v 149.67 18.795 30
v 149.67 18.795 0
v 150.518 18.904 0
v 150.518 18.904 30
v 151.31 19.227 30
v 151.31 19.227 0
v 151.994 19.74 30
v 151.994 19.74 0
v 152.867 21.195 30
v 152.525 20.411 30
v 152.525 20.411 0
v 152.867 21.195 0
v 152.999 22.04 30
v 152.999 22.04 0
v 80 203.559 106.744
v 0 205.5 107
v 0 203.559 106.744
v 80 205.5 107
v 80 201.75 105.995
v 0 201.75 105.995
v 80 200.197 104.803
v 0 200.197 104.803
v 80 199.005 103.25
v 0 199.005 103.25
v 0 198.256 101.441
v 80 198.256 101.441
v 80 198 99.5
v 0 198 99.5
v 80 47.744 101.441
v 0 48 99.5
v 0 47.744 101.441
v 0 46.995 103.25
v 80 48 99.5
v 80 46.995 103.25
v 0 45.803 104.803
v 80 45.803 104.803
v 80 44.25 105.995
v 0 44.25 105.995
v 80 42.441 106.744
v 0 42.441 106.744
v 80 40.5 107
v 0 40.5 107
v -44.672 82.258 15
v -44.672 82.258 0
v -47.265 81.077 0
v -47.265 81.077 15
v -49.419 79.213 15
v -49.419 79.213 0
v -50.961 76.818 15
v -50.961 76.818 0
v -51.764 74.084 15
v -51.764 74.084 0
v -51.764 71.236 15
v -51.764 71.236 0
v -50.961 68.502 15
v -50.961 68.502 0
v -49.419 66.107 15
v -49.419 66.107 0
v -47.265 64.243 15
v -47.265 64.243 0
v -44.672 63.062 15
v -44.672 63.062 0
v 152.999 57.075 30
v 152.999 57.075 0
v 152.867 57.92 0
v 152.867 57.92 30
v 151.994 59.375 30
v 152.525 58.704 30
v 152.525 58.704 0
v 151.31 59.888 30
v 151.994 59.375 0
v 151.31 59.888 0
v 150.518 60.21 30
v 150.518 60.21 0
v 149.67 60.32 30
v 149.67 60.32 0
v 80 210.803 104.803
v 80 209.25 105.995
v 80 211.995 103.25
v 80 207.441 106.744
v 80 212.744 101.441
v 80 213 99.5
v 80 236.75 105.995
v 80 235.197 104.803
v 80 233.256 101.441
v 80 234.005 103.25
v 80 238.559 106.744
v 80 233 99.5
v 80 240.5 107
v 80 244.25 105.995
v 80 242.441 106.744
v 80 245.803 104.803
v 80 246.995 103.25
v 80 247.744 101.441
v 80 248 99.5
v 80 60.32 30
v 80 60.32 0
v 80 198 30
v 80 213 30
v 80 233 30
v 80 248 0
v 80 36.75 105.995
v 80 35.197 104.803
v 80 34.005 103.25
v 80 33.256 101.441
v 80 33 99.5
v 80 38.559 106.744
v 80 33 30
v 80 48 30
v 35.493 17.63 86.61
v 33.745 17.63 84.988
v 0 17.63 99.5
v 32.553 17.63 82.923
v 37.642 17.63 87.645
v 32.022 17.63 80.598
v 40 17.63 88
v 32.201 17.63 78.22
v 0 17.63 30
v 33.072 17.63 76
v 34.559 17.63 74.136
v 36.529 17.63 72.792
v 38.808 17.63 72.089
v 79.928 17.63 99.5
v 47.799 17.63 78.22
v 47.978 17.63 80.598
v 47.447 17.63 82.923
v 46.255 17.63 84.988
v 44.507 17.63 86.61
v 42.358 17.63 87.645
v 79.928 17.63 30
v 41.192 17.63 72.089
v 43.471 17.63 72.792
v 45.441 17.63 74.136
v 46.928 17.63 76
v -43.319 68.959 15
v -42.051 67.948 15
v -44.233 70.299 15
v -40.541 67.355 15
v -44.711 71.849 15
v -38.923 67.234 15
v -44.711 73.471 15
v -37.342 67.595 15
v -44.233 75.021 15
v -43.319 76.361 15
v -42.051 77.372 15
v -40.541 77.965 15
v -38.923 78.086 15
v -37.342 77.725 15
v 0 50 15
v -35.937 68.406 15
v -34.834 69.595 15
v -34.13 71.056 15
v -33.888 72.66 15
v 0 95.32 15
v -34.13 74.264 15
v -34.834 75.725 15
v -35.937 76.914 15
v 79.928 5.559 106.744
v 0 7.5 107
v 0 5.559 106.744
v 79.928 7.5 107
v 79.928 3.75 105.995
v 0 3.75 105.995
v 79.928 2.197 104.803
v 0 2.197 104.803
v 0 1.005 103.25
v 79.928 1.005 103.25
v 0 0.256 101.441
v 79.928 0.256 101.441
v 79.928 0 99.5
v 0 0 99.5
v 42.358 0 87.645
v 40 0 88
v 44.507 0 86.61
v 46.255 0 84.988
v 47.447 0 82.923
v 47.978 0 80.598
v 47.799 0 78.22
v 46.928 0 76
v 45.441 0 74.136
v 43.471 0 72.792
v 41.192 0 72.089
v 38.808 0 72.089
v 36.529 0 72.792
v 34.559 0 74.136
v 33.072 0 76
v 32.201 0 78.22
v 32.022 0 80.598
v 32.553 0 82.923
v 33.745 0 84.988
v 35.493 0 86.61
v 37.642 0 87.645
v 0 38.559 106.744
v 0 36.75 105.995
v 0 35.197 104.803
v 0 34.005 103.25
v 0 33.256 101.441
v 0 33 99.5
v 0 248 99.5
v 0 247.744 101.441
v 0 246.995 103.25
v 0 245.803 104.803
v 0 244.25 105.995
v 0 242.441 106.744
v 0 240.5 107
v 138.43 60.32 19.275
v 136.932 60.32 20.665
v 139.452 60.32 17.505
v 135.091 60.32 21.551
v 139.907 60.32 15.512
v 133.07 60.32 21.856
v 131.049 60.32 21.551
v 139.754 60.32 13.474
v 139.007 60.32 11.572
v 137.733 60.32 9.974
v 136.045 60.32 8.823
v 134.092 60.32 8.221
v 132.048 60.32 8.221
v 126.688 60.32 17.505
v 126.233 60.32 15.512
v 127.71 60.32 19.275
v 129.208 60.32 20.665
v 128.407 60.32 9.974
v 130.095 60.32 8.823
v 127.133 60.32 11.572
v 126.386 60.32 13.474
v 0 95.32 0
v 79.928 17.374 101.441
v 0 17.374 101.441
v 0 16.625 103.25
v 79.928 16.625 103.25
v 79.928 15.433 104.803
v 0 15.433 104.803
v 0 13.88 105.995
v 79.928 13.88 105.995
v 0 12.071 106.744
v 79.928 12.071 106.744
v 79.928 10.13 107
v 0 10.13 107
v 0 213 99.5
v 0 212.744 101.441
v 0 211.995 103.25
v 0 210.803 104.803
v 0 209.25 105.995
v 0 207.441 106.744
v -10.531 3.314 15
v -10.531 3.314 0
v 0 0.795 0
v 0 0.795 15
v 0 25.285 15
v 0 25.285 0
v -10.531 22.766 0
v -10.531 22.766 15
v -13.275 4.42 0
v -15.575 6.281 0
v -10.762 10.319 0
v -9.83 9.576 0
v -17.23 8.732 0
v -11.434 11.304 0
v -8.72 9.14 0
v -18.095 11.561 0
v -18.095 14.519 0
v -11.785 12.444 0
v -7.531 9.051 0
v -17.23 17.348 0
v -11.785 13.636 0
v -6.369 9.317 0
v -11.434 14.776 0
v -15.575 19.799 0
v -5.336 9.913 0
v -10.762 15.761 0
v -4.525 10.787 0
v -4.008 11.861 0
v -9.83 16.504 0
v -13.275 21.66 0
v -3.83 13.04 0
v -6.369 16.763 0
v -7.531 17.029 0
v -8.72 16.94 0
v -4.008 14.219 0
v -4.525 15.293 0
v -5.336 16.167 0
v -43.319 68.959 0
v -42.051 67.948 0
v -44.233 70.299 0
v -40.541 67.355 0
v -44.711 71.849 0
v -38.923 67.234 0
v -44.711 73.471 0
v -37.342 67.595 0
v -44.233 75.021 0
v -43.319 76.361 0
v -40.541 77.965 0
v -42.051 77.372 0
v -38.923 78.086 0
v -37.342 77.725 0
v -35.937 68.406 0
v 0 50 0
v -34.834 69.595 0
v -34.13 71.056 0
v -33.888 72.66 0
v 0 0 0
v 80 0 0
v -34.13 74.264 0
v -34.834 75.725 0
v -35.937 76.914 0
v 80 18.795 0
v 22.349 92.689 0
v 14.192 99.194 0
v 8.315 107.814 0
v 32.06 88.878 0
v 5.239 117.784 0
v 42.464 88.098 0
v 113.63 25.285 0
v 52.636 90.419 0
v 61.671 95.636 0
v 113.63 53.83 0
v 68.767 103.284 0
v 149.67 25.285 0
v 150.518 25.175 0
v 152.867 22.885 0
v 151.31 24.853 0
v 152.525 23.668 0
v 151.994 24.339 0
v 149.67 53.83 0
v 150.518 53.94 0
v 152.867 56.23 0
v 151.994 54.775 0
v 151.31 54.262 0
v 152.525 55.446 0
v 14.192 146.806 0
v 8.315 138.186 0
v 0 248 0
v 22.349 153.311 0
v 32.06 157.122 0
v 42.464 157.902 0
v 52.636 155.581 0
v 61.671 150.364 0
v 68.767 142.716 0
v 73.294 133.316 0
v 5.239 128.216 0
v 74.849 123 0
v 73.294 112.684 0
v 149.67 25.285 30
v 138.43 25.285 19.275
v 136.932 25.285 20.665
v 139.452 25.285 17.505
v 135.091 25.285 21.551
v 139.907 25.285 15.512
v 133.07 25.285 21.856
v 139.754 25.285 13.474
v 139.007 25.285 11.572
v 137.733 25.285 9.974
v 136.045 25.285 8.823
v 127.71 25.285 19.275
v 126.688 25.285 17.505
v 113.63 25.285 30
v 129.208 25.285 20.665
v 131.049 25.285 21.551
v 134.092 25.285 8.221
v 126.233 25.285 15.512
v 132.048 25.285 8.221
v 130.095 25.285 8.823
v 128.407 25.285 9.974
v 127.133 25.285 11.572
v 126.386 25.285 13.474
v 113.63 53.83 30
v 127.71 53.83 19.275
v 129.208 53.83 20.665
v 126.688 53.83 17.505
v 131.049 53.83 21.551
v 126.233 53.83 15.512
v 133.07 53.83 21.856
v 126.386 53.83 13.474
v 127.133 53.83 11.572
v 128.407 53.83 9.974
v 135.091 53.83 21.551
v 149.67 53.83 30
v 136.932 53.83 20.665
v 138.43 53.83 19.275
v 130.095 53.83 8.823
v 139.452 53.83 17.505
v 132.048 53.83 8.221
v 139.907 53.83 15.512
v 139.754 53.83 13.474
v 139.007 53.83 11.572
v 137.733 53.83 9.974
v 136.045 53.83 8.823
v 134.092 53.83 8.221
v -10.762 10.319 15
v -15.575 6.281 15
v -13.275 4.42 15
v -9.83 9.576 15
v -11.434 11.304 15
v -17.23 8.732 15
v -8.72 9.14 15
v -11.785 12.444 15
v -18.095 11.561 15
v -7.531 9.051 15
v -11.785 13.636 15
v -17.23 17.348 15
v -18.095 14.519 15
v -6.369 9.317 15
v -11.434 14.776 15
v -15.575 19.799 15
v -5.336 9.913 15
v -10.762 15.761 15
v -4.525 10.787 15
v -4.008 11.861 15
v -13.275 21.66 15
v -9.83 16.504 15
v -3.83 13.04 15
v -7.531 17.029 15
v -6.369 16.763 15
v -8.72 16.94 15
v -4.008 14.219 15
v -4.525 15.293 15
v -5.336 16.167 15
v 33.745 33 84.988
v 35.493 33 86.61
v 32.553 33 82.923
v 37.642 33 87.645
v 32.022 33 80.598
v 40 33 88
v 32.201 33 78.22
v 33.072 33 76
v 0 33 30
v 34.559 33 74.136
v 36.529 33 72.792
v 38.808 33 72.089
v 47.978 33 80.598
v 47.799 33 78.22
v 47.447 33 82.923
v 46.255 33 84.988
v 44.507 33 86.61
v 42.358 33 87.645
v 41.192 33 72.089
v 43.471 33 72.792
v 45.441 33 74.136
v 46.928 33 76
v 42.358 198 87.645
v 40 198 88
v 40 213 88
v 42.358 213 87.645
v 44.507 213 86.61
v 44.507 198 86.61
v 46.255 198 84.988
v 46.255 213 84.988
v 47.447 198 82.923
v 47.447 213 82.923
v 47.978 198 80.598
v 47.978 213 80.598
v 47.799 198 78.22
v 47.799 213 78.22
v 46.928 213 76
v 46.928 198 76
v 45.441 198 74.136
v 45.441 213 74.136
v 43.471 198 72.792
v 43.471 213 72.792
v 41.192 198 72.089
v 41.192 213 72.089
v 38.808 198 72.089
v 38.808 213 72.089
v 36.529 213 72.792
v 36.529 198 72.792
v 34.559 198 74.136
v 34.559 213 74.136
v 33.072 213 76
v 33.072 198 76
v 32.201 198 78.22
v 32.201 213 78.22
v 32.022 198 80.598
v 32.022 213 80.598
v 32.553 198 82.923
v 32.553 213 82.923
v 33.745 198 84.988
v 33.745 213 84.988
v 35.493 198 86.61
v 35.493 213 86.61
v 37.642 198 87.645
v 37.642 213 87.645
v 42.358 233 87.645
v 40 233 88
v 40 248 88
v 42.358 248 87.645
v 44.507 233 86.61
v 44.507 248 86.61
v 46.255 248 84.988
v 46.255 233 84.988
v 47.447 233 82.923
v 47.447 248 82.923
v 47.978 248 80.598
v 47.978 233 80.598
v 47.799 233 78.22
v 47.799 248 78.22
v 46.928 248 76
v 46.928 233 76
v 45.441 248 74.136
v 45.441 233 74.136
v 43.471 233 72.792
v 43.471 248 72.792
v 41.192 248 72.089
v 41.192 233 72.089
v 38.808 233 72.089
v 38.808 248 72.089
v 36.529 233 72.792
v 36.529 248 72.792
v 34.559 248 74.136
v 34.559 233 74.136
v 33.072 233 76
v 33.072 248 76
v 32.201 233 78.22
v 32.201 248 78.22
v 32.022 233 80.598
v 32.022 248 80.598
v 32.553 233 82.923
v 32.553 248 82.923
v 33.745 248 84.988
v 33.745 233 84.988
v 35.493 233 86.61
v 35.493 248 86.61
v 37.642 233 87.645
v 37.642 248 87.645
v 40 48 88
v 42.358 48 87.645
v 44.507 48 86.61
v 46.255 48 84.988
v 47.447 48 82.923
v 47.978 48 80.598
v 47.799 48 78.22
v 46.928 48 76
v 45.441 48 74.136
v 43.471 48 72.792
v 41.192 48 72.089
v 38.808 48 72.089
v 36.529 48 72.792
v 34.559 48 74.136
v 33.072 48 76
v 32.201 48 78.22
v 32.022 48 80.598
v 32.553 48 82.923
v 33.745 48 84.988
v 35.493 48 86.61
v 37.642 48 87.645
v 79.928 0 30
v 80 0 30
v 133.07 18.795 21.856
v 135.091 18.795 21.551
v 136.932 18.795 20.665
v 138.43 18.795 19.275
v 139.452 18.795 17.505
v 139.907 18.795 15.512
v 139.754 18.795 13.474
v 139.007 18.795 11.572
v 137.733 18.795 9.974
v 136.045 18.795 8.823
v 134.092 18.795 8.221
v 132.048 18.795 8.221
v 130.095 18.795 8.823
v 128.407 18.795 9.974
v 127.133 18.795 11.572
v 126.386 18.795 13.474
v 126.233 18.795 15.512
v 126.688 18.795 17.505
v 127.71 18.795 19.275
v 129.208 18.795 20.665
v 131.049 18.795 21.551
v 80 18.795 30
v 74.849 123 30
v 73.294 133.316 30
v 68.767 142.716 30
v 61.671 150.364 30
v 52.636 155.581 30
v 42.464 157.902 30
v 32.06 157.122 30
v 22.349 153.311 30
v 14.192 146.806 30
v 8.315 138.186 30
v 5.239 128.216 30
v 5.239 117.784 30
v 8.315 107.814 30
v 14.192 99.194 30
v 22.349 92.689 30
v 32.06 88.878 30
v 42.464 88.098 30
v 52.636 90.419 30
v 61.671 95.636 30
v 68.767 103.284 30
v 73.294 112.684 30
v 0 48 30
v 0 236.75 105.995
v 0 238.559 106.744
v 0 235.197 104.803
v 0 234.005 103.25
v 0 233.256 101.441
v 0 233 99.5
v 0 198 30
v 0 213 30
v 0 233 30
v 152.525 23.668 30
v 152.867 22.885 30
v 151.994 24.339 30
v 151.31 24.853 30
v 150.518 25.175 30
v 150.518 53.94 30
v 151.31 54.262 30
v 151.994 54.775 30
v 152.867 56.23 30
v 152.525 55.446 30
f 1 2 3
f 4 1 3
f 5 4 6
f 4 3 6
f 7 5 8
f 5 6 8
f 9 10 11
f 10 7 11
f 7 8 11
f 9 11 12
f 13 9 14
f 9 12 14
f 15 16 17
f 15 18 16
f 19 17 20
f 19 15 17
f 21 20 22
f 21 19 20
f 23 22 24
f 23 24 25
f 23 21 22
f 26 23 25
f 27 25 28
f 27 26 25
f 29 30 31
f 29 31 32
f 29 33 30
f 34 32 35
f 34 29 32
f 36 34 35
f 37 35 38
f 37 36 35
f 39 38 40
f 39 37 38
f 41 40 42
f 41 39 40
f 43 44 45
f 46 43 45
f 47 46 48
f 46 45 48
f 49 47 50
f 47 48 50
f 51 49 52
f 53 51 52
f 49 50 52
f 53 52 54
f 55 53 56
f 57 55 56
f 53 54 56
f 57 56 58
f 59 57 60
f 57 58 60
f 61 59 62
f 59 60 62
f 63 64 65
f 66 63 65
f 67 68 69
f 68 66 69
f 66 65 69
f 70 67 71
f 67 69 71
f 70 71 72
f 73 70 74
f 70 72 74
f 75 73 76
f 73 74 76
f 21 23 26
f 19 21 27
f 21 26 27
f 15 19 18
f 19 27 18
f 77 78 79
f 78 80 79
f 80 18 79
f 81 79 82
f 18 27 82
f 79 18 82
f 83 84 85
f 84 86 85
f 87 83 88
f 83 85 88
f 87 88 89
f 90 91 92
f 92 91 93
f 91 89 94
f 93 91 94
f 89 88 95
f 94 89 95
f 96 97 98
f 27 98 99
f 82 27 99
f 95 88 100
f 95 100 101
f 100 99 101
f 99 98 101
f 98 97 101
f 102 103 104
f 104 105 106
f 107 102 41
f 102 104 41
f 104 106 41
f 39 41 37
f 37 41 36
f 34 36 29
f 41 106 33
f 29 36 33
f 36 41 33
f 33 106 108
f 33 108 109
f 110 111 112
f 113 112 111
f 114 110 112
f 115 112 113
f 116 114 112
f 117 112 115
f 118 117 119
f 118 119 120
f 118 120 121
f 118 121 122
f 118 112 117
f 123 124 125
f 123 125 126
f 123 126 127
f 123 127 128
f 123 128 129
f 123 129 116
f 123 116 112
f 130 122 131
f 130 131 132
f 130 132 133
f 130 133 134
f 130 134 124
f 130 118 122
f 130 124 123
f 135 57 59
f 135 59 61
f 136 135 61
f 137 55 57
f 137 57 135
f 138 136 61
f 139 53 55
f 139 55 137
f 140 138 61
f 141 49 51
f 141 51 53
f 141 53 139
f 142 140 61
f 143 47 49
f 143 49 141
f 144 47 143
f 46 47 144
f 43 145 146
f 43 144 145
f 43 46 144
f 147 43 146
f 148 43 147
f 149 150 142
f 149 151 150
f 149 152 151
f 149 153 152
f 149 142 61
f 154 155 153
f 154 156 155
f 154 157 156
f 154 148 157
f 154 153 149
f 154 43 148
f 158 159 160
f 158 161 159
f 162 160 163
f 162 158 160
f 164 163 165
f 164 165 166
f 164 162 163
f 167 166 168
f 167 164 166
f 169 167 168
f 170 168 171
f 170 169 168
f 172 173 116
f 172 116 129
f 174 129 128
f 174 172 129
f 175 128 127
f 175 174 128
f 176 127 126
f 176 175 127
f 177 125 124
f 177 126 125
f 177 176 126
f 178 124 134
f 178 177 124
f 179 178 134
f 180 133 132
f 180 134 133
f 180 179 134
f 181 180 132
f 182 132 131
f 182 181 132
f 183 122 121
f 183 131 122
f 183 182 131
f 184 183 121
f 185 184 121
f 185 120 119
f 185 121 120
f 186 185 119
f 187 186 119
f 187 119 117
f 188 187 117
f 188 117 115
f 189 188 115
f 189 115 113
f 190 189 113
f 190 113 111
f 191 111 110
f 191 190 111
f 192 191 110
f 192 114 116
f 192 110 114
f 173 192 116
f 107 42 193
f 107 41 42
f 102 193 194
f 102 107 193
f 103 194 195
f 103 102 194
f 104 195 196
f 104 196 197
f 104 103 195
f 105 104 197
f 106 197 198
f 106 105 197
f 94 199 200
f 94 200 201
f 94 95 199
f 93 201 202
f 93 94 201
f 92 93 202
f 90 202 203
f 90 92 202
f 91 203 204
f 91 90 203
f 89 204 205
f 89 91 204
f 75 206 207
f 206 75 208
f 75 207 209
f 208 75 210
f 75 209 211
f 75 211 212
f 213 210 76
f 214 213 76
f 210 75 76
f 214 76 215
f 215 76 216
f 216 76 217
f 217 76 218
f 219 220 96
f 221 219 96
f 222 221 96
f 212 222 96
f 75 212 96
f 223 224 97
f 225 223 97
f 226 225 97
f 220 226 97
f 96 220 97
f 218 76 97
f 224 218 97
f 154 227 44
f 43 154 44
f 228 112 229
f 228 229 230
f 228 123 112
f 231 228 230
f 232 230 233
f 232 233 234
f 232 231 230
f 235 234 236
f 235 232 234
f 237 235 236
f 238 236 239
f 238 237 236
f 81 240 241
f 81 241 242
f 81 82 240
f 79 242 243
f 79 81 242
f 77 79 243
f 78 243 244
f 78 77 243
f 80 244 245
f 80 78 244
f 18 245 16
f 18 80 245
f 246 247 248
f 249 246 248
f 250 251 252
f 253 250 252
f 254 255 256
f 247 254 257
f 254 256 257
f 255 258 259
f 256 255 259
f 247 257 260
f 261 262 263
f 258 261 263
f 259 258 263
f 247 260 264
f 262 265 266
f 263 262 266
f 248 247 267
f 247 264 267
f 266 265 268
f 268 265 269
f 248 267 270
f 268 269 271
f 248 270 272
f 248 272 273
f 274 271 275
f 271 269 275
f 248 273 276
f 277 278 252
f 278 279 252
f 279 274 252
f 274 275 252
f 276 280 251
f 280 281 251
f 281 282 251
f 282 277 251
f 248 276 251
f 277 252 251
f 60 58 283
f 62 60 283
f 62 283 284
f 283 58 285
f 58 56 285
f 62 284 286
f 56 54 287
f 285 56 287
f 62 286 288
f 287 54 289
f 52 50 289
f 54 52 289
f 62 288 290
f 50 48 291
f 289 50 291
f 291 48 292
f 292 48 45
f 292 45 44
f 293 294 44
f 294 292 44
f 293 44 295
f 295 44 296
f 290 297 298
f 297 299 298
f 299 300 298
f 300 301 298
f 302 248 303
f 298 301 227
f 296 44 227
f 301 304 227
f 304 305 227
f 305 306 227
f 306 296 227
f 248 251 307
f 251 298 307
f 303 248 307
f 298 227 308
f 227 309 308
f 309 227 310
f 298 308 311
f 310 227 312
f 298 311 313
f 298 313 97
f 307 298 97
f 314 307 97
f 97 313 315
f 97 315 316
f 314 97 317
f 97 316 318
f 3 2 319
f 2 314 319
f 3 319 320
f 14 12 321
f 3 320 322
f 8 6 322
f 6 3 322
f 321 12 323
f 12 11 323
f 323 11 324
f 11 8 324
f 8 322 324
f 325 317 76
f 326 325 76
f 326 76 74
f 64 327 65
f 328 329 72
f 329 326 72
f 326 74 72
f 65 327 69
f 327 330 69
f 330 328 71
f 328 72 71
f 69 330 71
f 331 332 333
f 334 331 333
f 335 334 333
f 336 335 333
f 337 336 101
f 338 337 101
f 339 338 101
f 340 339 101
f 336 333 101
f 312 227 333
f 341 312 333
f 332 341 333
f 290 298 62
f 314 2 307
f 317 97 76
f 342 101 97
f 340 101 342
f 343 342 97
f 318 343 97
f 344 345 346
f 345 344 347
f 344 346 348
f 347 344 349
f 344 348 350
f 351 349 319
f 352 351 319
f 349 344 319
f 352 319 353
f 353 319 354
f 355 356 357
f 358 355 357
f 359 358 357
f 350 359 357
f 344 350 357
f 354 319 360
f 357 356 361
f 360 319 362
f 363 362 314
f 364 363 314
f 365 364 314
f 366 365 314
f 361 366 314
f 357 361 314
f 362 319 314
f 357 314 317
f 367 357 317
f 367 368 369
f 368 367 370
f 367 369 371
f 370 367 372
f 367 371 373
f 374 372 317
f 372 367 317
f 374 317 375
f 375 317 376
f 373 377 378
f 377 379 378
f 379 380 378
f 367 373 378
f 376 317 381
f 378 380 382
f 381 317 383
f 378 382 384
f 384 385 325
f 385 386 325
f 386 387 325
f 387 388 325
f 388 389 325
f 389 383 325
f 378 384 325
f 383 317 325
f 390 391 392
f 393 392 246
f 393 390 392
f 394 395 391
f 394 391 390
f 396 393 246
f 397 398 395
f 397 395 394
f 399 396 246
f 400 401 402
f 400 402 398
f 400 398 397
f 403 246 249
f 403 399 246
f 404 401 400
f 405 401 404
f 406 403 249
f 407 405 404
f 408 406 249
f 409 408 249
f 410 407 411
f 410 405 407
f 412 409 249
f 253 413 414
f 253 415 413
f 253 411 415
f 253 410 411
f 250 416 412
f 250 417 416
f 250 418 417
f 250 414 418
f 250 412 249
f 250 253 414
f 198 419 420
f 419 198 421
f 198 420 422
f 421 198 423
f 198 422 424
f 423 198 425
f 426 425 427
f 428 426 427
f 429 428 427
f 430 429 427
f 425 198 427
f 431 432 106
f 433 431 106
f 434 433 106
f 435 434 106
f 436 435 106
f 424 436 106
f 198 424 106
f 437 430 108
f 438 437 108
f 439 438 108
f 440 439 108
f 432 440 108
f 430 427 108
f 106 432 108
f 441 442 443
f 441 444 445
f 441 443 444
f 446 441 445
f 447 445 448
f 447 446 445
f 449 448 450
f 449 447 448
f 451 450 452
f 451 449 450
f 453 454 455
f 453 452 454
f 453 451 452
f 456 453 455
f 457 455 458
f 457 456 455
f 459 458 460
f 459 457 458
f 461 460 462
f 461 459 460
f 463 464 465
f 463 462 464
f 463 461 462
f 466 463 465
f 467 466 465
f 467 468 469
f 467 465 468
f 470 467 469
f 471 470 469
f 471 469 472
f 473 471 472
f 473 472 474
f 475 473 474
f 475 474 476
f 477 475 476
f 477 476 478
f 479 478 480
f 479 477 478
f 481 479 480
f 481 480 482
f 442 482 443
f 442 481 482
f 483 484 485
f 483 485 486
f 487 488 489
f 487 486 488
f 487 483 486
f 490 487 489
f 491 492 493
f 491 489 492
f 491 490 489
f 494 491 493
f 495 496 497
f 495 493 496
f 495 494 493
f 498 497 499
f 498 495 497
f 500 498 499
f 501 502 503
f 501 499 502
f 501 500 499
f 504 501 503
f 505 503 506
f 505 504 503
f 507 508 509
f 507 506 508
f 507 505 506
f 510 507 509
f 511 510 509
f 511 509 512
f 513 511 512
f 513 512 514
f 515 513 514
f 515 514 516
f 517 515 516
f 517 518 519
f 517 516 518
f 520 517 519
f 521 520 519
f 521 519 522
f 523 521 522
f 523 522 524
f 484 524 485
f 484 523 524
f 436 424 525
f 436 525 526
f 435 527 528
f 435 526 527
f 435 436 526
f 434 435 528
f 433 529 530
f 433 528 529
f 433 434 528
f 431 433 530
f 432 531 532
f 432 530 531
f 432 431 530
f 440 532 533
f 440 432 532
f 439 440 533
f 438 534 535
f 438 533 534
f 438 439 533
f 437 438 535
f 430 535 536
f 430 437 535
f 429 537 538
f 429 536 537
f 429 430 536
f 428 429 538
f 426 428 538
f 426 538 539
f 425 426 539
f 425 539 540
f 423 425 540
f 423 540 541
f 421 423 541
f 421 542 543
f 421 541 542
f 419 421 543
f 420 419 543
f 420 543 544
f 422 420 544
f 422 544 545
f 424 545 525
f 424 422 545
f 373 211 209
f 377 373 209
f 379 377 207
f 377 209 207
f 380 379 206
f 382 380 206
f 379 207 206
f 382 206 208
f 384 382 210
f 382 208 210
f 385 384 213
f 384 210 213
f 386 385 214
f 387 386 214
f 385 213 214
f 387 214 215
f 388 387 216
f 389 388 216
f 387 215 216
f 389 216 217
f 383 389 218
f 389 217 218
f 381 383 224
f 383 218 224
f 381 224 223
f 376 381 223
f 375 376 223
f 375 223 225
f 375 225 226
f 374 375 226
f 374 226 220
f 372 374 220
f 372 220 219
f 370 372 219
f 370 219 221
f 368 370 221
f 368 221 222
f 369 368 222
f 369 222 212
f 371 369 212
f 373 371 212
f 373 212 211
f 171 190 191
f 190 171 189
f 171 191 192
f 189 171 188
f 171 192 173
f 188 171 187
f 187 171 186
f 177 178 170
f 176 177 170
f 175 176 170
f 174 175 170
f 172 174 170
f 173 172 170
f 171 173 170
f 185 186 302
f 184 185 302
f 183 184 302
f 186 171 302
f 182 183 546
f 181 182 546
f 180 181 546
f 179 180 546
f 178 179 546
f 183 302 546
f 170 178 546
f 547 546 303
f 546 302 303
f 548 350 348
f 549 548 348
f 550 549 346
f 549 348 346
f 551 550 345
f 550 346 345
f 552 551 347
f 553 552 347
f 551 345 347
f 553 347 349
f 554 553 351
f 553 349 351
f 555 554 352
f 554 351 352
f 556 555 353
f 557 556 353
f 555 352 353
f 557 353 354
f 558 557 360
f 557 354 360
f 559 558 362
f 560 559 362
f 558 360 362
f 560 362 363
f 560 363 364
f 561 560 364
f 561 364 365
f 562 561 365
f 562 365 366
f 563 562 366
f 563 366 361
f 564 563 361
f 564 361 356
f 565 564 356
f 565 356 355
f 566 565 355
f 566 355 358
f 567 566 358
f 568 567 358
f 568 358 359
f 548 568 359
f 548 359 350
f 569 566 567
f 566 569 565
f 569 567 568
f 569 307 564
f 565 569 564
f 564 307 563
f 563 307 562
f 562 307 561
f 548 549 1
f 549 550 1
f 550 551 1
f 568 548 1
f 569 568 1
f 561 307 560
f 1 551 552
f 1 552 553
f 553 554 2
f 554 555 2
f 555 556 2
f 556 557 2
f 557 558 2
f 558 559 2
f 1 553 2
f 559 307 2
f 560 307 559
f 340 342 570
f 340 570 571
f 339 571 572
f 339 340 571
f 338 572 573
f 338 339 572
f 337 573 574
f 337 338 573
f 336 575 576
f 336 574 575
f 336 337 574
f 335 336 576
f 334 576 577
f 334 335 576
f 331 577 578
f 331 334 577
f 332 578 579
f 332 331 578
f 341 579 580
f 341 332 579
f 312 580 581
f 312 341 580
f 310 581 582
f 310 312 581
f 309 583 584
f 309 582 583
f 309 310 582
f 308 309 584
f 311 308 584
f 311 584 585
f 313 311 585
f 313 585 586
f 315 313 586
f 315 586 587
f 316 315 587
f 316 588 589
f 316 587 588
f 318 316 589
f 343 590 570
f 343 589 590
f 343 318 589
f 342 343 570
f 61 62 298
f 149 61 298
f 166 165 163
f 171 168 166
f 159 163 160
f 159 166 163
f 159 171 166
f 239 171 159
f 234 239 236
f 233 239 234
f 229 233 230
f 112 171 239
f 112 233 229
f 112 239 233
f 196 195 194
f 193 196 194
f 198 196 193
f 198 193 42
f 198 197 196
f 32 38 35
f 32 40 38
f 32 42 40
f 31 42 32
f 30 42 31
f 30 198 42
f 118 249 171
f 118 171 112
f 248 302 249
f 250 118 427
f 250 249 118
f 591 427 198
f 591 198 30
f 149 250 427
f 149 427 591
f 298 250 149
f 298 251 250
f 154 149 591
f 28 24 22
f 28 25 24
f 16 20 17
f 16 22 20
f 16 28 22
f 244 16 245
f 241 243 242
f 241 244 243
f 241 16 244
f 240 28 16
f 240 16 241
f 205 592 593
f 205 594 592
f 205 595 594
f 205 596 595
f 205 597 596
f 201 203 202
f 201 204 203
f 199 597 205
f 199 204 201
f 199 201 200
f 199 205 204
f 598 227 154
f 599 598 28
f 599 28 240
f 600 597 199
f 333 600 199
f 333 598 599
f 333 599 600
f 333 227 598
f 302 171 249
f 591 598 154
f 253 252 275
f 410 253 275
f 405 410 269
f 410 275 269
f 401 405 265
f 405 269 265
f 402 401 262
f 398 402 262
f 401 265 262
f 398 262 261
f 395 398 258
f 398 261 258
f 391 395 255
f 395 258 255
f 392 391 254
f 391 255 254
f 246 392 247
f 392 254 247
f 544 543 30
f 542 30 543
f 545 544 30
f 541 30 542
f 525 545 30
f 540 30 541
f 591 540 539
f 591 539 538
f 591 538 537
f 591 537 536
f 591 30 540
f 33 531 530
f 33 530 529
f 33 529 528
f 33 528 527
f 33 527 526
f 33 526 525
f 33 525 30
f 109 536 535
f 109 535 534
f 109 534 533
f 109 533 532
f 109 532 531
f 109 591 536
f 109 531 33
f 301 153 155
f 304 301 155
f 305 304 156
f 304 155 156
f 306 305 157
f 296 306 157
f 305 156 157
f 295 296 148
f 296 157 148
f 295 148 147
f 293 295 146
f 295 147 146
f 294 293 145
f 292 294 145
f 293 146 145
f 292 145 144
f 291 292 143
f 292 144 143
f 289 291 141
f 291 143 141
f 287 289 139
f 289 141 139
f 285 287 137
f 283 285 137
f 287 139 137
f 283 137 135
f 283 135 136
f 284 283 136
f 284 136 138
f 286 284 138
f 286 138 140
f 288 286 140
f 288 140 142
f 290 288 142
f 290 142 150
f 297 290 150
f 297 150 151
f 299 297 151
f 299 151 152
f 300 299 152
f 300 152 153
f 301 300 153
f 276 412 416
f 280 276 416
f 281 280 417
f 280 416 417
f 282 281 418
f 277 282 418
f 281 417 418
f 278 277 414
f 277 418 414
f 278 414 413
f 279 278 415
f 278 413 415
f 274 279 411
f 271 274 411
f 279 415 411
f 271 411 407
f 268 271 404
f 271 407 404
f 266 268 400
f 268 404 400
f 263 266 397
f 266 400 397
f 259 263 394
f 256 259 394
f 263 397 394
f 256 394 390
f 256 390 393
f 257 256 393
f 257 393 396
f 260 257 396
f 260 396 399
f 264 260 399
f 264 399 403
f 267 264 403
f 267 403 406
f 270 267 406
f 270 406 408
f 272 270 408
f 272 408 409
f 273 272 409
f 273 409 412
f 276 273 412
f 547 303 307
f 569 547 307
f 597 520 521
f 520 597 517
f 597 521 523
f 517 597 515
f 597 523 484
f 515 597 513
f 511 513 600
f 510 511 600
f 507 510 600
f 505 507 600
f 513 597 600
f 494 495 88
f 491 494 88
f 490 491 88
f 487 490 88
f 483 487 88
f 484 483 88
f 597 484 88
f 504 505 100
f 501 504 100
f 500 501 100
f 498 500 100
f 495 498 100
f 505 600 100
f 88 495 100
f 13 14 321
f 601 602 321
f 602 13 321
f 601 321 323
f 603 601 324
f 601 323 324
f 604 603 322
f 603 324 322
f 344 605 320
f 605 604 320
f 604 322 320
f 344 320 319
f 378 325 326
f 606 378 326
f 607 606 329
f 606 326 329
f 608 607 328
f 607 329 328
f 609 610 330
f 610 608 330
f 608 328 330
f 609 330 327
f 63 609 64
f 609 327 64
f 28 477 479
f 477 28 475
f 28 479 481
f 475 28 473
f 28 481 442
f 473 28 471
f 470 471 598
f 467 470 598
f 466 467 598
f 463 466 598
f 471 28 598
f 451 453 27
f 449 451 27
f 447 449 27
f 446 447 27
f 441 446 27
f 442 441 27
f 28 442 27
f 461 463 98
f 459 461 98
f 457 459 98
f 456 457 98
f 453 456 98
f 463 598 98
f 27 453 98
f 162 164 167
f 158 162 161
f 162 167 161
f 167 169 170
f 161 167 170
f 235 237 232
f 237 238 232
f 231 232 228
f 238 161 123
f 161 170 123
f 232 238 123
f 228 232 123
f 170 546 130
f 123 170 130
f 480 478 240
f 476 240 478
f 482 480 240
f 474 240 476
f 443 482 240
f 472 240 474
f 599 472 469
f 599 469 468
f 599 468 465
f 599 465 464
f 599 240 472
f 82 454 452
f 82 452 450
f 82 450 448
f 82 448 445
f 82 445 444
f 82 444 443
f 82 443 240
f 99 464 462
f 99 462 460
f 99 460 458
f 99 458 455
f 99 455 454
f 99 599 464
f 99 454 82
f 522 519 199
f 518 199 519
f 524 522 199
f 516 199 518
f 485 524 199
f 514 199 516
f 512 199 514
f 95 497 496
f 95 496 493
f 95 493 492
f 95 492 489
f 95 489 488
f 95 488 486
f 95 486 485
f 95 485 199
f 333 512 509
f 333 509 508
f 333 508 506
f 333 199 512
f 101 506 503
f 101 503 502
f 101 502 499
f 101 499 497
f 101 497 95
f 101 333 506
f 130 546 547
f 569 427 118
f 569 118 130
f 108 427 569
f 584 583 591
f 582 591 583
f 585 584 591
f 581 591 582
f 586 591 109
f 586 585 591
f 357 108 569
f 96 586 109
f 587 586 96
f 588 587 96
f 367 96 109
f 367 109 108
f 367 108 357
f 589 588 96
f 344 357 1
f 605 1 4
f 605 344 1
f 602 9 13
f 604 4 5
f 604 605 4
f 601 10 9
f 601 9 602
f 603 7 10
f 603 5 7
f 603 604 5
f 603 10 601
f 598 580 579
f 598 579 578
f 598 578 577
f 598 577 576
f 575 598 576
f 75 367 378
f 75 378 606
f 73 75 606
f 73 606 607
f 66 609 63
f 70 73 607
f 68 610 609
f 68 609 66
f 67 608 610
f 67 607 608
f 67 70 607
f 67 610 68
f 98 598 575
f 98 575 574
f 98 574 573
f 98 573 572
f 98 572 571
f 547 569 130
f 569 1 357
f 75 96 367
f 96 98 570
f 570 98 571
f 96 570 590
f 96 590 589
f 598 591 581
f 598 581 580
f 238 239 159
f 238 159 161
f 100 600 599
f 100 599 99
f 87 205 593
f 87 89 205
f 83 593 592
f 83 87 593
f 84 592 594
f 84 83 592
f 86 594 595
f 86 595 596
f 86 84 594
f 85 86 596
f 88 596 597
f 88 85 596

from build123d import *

# Parameters (mm, degrees)
SKETCH2_W               = 80
SKETCH2_H               = 248
BOSS_EXTRUDE1_DEPTH     = 30
BOSS_EXTRUDE2_DEPTH     = 15
SKETCH3_W               = 80
SKETCH3_H               = 15
SKETCH3_W_2             = 79.927982428
SKETCH3_H_2             = 17.63
BOSS_EXTRUDE3_DEPTH     = 107
FILLET1_R               = 7.5
FILLET2_R               = 3.33
CUT_EXTRUDE1_DEPTH      = 311.421758238
CUT_EXTRUDE1_DEPTH_BACK = 311.421758238
SKETCH4_R               = 35
CUT_EXTRUDE2_DEPTH      = 311.421758238
CUT_EXTRUDE2_DEPTH_BACK = 311.421758238
SKETCH5_R               = 8
SKETCH6_R               = 6.855911781
CUT_EXTRUDE3_DEPTH      = 265.72901312
SKETCH7_R               = 5.441513082
CUT_EXTRUDE4_DEPTH      = 306.575961076
SKETCH8_R               = 4
CUT_EXTRUDE5_DEPTH      = 306.575961076


# Some blends are built 0.0001 mm under size
with BuildPart() as part:
    # Sketch2 → Boss-Extrude1 (new body)
    with BuildSketch(Plane.XY):
        with Locations((40, 124)):
            Rectangle(SKETCH2_W, SKETCH2_H)
        Polygon((153, 60.32), (80, 60.32), (80, 18.794599866), (153, 18.794599866), (153, 25.284599866), (113.63, 25.284599866), (113.63, 53.83), (153, 53.83), align=None)
    extrude(amount=BOSS_EXTRUDE1_DEPTH)

    # Sketch2<5> → Boss-Extrude2 (add)
    with BuildSketch(Plane.XY):
        with BuildLine():
            Line((0, 50), (0, 95.32))
            Line((0, 95.32), (-44.67244089, 82.258125951))
            ThreePointArc((-44.67244089, 82.258125951), (-51.866023561, 72.66), (-44.67244089, 63.061874049))
            Line((-44.67244089, 63.061874049), (0, 50))
        make_face()
        with BuildLine():
            Line((-10.531496207, 3.314319271), (0, 0.795400134))
            Line((0, 0.795400134), (0, 25.284599866))
            Line((0, 25.284599866), (-10.531496207, 22.765680729))
            ThreePointArc((-10.531496207, 22.765680729), (-18.205311701, 13.04), (-10.531496207, 3.314319271))
        make_face()
    extrude(amount=BOSS_EXTRUDE2_DEPTH)

    # Sketch3 → Boss-Extrude3 (add)
    with BuildSketch(Plane.XY):
        with Locations((40, 240.5)):
            Rectangle(SKETCH3_W, SKETCH3_H)
        with Locations((40, 205.5)):
            Rectangle(SKETCH3_W, SKETCH3_H)
        with Locations((40, 40.5)):
            Rectangle(SKETCH3_W, SKETCH3_H)
        with Locations((39.963991214, 8.815)):
            Rectangle(SKETCH3_W_2, SKETCH3_H_2)
    extrude(amount=BOSS_EXTRUDE3_DEPTH)

    # Fillet1
    fillet1_edges = [part.edges().sort_by_distance(p)[0] for p in [
        (39.963991214, 0, 107),
        (39.963991214, 17.63, 107),
        (40, 33, 107),
        (40, 48, 107),
        (40, 198, 107),
        (40, 213, 107),
        (40, 233, 107),
        (40, 248, 107),
    ]]
    fillet(fillet1_edges, radius=FILLET1_R - 0.0001)  # a hair under: the kernel refuses the full size

    # Fillet2
    # the kernel refuses this fillet: 3.33 mm, written as the material it takes off along each edge
    with BuildSketch(Plane(origin=(153, 18.794599866, -8.325), x_dir=(-1, 0, 0), z_dir=(0, 0, 1)), Plane(origin=(153, 25.284599866, -8.325), x_dir=(0, -1, 0), z_dir=(0, 0, 1)), Plane(origin=(153, 53.83, -8.325), x_dir=(-1, 0, 0), z_dir=(0, 0, 1)), Plane(origin=(153, 60.32, -8.325), x_dir=(0, -1, 0), z_dir=(0, 0, 1))) as fillet2_piece_1:
        with BuildLine():
            CenterArc((FILLET2_R, -FILLET2_R), FILLET2_R, 90, 90)
            Line((0, -FILLET2_R), (0, 0))
            Line((0, 0), (FILLET2_R, 0))
        make_face()
    extrude(amount=46.65, mode=Mode.SUBTRACT)

    # Sketch4 → Cut-Extrude1 (cut, two sides: drawn at the far end of the back side and taken through both)
    with BuildSketch(Plane.XY.offset(-CUT_EXTRUDE1_DEPTH_BACK)):
        with Locations((39.848575035, 123)):
            Circle(SKETCH4_R)
    extrude(amount=CUT_EXTRUDE1_DEPTH + CUT_EXTRUDE1_DEPTH_BACK, mode=Mode.SUBTRACT)

    # Sketch5 → Cut-Extrude2 (cut, two sides: drawn at the far end of the back side and taken through both)
    with BuildSketch(Plane(origin=(0, 0, 0), x_dir=(1, 0, 0), z_dir=(0, 1, 0)).offset(-CUT_EXTRUDE2_DEPTH_BACK)):
        with Locations(Location((40, -80, 0), (0, 0, 270))):
            Circle(SKETCH5_R)
    extrude(amount=CUT_EXTRUDE2_DEPTH + CUT_EXTRUDE2_DEPTH_BACK, mode=Mode.SUBTRACT)

    # Sketch6 → Cut-Extrude3 (cut, through all)
    with BuildSketch(Plane(origin=(0, 60.32, 0), x_dir=(1, 0, 0), z_dir=(0, 1, 0))):
        with Locations(Location((133.07, -15, 0), (0, 0, 270))):
            Circle(SKETCH6_R)
    extrude(amount=-CUT_EXTRUDE3_DEPTH, mode=Mode.SUBTRACT)

    # Sketch7 → Cut-Extrude4 (cut, through all)
    with BuildSketch(Plane.XY.offset(15)):
        with Locations((-39.33, 72.66)):
            Circle(SKETCH7_R)
    extrude(amount=-CUT_EXTRUDE4_DEPTH, mode=Mode.SUBTRACT)

    # Sketch8 → Cut-Extrude5 (cut, through all)
    with BuildSketch(Plane.XY.offset(15)):
        with Locations((-7.83, 13.04)):
            Circle(SKETCH8_R)
    extrude(amount=-CUT_EXTRUDE5_DEPTH, mode=Mode.SUBTRACT)


solid = part.part
